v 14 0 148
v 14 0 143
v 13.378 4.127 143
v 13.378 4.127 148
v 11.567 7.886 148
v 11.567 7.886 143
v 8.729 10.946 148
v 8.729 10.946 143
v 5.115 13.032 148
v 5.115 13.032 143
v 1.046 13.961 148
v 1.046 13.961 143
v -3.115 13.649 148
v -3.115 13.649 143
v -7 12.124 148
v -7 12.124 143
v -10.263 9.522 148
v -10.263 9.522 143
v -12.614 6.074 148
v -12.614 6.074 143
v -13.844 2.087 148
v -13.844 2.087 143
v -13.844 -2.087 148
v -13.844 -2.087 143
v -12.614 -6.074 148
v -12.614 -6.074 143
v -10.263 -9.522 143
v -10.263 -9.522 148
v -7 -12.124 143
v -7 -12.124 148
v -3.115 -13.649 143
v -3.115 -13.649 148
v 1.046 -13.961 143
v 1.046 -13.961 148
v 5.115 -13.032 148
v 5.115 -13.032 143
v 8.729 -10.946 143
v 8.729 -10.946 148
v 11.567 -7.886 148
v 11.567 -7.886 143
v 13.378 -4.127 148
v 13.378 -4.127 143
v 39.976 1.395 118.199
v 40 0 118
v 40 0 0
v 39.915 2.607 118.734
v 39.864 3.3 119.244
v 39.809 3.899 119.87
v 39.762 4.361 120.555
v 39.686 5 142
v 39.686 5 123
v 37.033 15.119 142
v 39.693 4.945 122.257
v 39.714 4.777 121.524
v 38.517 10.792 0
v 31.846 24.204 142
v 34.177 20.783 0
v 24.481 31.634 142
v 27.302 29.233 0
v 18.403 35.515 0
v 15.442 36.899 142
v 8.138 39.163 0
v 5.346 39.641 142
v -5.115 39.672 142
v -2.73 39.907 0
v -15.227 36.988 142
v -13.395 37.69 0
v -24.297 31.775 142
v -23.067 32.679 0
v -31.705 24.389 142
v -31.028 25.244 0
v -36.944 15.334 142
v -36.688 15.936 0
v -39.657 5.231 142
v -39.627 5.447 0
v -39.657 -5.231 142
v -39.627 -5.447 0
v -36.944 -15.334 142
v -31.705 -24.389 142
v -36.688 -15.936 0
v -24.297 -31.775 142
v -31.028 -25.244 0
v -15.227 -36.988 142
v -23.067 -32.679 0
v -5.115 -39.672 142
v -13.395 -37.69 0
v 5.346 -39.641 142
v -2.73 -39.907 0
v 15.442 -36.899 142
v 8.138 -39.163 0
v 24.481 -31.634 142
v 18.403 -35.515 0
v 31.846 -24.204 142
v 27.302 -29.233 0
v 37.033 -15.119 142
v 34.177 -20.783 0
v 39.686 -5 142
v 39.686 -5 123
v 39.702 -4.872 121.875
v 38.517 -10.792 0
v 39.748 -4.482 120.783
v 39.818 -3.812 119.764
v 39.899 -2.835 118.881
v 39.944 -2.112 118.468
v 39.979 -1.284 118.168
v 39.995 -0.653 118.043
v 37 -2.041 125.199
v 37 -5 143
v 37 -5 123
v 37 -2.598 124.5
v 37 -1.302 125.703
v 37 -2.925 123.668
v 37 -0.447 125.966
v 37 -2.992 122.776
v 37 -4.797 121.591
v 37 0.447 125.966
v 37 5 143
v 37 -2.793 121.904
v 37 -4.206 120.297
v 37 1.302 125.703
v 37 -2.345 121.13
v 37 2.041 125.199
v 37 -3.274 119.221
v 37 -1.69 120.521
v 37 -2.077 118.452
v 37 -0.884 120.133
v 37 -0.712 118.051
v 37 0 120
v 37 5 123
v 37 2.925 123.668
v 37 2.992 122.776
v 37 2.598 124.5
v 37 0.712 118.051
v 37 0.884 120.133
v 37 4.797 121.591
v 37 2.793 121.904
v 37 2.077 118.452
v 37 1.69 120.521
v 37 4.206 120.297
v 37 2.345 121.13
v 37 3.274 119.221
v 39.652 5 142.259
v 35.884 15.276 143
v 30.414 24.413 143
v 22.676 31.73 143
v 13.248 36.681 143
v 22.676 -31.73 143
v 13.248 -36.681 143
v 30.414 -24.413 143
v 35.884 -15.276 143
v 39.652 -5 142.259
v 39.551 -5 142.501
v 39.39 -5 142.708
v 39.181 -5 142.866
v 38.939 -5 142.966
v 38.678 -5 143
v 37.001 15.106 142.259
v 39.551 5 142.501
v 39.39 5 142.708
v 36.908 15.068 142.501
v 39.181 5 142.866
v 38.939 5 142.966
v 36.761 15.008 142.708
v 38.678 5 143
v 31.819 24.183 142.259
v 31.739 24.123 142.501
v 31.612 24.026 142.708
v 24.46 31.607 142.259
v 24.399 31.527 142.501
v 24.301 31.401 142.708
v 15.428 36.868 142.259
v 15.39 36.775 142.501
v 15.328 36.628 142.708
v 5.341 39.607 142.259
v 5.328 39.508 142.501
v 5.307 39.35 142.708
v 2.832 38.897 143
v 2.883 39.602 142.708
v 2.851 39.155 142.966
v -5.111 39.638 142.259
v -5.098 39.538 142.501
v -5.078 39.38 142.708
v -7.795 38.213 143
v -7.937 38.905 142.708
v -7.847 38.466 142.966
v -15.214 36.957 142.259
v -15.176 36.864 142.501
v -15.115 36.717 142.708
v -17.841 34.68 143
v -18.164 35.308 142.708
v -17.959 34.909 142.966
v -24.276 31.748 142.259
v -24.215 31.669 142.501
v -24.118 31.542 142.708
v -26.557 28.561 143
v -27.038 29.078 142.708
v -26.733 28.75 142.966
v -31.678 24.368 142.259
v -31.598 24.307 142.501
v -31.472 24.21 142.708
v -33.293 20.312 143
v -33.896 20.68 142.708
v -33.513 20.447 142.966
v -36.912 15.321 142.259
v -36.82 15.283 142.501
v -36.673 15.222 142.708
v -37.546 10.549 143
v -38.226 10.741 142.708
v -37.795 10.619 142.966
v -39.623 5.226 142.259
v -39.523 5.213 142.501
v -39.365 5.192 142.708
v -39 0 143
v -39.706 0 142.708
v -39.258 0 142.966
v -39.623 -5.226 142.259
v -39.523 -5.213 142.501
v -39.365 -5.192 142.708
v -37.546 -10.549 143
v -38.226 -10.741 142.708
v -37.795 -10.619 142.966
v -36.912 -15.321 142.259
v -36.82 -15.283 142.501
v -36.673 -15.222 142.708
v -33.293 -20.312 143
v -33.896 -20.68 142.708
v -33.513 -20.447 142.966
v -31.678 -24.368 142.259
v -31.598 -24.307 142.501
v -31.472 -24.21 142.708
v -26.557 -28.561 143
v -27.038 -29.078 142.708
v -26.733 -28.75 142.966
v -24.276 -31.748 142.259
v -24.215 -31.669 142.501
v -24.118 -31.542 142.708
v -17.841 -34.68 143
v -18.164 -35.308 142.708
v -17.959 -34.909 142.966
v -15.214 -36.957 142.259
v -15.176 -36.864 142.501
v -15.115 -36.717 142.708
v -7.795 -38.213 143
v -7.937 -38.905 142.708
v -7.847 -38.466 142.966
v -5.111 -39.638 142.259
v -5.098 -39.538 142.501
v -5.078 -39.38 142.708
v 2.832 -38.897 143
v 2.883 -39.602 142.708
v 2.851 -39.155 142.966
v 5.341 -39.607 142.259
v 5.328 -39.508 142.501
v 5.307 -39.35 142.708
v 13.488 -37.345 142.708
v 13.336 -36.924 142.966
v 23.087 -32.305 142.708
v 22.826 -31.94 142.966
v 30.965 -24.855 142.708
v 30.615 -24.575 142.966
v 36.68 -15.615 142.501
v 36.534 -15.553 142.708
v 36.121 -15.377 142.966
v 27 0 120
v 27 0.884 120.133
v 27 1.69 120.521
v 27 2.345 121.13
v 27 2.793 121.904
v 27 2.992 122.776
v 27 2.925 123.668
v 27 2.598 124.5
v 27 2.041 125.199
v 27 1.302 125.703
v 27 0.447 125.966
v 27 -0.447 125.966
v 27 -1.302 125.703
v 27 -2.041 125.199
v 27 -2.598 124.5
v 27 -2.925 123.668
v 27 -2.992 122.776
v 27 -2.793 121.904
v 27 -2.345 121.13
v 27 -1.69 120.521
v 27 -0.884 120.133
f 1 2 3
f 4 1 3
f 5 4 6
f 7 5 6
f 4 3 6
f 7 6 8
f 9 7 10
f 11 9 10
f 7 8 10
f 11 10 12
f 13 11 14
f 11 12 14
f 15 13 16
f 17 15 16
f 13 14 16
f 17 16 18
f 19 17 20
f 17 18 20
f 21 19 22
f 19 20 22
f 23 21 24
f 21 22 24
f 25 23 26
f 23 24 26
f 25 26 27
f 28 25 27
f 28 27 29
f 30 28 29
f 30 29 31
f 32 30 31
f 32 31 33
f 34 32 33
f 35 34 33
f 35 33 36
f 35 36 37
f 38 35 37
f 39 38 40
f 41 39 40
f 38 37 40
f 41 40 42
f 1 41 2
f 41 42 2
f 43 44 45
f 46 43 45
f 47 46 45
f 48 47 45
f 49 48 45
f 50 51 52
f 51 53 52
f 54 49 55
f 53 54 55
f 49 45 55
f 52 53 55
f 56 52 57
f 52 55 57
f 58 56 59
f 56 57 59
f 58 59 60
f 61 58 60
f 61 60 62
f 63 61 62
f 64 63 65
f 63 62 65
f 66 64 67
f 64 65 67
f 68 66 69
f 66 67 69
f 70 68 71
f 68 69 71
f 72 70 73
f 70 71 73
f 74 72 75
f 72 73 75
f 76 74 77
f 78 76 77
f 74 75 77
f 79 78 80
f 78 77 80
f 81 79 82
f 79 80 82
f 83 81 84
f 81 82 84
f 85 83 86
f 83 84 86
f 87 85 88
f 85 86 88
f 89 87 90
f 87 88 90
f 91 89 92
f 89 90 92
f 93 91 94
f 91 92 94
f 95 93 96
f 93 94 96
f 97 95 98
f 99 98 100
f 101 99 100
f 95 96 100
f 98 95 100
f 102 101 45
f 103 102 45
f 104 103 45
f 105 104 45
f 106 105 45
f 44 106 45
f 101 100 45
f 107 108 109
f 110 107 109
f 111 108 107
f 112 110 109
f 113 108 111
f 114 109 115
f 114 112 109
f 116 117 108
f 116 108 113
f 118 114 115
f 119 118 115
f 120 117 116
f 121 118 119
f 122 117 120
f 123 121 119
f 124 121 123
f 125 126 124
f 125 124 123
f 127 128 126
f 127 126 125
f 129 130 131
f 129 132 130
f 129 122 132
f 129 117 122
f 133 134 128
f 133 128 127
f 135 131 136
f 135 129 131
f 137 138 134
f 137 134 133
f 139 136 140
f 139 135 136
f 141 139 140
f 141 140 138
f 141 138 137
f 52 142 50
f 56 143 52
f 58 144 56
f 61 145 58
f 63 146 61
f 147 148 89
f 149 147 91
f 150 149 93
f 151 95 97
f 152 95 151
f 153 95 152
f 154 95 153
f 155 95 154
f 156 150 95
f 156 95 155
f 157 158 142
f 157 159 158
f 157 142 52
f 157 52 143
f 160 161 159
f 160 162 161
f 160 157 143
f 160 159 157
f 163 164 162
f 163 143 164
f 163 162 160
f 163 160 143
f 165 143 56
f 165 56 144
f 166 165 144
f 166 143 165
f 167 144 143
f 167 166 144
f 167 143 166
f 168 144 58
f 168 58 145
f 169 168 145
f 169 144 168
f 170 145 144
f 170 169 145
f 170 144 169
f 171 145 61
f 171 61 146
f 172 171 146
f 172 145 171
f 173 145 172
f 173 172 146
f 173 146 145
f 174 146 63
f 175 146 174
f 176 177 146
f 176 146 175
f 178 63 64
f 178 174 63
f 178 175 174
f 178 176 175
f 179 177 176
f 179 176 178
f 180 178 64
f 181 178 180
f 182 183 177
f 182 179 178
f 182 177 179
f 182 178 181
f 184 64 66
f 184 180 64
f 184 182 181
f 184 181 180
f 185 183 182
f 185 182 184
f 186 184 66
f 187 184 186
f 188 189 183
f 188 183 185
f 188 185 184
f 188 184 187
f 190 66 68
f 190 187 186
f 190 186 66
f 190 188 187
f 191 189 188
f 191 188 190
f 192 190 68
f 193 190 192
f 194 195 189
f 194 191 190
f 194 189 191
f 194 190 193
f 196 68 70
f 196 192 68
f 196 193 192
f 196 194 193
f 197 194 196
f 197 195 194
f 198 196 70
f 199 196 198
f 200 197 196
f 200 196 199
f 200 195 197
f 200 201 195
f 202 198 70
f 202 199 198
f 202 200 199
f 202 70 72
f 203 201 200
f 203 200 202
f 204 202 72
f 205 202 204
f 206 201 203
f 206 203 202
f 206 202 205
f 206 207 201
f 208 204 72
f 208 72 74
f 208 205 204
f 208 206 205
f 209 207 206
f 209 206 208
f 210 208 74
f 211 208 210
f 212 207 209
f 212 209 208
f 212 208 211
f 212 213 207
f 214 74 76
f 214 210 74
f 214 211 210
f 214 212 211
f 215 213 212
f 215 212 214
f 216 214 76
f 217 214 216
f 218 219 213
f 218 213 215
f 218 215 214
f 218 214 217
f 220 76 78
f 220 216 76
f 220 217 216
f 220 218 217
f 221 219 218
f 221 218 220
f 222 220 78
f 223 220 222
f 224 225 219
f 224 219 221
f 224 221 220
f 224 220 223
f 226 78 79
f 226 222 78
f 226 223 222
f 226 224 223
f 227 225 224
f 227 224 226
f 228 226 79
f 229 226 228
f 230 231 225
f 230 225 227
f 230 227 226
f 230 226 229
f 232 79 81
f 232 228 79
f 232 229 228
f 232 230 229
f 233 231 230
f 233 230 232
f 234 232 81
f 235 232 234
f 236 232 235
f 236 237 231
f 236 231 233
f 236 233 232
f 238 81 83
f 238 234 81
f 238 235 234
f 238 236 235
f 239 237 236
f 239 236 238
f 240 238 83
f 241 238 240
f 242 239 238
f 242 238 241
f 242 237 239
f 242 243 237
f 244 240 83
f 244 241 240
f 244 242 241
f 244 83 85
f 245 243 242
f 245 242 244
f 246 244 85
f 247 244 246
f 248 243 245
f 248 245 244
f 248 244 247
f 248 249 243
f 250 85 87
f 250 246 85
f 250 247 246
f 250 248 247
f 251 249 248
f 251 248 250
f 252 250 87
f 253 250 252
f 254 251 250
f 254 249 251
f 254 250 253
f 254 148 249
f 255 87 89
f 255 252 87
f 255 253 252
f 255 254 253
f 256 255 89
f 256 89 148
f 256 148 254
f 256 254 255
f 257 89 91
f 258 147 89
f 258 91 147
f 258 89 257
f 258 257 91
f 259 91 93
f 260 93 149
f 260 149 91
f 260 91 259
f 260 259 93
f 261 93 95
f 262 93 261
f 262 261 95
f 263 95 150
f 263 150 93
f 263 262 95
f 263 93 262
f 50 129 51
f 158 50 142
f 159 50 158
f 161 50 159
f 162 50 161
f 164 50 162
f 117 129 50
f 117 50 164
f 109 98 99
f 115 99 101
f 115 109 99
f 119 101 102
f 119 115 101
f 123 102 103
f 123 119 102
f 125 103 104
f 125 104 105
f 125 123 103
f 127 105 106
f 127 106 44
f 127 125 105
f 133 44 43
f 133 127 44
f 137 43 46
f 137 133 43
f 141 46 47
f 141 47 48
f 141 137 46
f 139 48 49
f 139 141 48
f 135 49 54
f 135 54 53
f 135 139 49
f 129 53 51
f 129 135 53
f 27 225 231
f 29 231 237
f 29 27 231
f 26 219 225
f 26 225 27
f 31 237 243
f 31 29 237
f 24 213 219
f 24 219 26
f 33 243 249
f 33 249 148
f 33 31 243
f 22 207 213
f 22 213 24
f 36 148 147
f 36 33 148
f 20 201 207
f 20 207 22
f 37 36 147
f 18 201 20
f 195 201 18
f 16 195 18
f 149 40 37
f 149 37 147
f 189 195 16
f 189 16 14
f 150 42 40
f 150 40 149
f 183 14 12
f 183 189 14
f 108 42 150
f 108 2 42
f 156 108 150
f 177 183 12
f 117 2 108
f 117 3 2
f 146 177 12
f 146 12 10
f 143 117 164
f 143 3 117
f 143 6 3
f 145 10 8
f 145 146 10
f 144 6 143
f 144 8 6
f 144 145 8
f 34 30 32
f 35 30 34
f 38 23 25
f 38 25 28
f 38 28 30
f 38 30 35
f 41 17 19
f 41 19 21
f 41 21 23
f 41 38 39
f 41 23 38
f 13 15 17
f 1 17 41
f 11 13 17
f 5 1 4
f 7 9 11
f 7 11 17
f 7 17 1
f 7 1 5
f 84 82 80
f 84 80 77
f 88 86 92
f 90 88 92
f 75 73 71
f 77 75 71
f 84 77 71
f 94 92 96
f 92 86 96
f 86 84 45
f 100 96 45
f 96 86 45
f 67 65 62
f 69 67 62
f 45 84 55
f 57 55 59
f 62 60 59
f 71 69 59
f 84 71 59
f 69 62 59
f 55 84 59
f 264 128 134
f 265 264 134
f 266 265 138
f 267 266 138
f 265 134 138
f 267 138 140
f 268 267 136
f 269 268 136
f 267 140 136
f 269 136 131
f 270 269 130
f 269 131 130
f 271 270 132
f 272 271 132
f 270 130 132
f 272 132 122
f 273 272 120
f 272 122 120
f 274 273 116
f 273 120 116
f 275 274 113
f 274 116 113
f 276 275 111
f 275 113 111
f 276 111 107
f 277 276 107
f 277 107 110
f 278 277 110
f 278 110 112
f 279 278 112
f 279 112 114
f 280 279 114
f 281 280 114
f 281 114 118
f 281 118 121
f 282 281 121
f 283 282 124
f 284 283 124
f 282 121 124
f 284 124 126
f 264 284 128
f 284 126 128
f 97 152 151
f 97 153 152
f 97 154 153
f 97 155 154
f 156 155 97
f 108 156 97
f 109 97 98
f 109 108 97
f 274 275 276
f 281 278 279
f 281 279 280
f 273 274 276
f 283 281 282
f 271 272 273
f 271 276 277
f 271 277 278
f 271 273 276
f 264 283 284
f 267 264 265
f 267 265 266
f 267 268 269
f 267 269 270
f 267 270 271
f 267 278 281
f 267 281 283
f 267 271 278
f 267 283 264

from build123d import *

# Parameters (mm, degrees)
SKETCH_1_R          = 40
EXTRUDE_1_DEPTH     = 113
SKETCH_2_R          = 40
EXTRUDE_2_DEPTH     = 30
SKETCH_3_R          = 14
EXTRUDE_3_DEPTH     = 5
CUT_EXTRUDE_1_DEPTH = 34
SKETCH_6_R          = 3
CUT_EXTRUDE_2_DEPTH = 10
FILLET_1_R          = 1


with BuildPart() as part:
    # 草图1 → 凸台-拉伸1 (new body)
    with BuildSketch(Plane.XY):
        Circle(SKETCH_1_R)
    extrude(amount=EXTRUDE_1_DEPTH)

    # 草图2 → 凸台-拉伸2 (add)
    with BuildSketch(Plane.XY.offset(113)):
        Circle(SKETCH_2_R)
    extrude(amount=EXTRUDE_2_DEPTH)

    # 草图3 → 凸台-拉伸3 (add)
    with BuildSketch(Plane.XY.offset(143)):
        Circle(SKETCH_3_R)
    extrude(amount=EXTRUDE_3_DEPTH)

    # 草图5 → 切除-拉伸1 (cut)
    with BuildSketch(Plane(origin=(37, 0, 0), x_dir=(0, 0, -1), z_dir=(1, 0, 0))):
        with BuildLine():
            Line((-143, 0), (-143, -5))
            Line((-143, -5), (-123, -5))
            ThreePointArc((-123, -5), (-118, 0), (-123, 5))
            Line((-123, 5), (-143, 5))
            Line((-143, 5), (-143, 0))
        make_face()
    extrude(amount=CUT_EXTRUDE_1_DEPTH, mode=Mode.SUBTRACT)

    # 草图6 → 切除-拉伸2 (cut)
    with BuildSketch(Plane(origin=(37, 0, 0), x_dir=(0, 0, -1), z_dir=(1, 0, 0))):
        with Locations((-123, 0)):
            Circle(SKETCH_6_R)
    extrude(amount=-CUT_EXTRUDE_2_DEPTH, mode=Mode.SUBTRACT)

    # 圆角1
    fillet_1_edges = [part.edges().sort_by_distance(p)[0] for p in [
        (-40, 0, 143),
    ]]
    fillet(fillet_1_edges, radius=FILLET_1_R)


solid = part.part
